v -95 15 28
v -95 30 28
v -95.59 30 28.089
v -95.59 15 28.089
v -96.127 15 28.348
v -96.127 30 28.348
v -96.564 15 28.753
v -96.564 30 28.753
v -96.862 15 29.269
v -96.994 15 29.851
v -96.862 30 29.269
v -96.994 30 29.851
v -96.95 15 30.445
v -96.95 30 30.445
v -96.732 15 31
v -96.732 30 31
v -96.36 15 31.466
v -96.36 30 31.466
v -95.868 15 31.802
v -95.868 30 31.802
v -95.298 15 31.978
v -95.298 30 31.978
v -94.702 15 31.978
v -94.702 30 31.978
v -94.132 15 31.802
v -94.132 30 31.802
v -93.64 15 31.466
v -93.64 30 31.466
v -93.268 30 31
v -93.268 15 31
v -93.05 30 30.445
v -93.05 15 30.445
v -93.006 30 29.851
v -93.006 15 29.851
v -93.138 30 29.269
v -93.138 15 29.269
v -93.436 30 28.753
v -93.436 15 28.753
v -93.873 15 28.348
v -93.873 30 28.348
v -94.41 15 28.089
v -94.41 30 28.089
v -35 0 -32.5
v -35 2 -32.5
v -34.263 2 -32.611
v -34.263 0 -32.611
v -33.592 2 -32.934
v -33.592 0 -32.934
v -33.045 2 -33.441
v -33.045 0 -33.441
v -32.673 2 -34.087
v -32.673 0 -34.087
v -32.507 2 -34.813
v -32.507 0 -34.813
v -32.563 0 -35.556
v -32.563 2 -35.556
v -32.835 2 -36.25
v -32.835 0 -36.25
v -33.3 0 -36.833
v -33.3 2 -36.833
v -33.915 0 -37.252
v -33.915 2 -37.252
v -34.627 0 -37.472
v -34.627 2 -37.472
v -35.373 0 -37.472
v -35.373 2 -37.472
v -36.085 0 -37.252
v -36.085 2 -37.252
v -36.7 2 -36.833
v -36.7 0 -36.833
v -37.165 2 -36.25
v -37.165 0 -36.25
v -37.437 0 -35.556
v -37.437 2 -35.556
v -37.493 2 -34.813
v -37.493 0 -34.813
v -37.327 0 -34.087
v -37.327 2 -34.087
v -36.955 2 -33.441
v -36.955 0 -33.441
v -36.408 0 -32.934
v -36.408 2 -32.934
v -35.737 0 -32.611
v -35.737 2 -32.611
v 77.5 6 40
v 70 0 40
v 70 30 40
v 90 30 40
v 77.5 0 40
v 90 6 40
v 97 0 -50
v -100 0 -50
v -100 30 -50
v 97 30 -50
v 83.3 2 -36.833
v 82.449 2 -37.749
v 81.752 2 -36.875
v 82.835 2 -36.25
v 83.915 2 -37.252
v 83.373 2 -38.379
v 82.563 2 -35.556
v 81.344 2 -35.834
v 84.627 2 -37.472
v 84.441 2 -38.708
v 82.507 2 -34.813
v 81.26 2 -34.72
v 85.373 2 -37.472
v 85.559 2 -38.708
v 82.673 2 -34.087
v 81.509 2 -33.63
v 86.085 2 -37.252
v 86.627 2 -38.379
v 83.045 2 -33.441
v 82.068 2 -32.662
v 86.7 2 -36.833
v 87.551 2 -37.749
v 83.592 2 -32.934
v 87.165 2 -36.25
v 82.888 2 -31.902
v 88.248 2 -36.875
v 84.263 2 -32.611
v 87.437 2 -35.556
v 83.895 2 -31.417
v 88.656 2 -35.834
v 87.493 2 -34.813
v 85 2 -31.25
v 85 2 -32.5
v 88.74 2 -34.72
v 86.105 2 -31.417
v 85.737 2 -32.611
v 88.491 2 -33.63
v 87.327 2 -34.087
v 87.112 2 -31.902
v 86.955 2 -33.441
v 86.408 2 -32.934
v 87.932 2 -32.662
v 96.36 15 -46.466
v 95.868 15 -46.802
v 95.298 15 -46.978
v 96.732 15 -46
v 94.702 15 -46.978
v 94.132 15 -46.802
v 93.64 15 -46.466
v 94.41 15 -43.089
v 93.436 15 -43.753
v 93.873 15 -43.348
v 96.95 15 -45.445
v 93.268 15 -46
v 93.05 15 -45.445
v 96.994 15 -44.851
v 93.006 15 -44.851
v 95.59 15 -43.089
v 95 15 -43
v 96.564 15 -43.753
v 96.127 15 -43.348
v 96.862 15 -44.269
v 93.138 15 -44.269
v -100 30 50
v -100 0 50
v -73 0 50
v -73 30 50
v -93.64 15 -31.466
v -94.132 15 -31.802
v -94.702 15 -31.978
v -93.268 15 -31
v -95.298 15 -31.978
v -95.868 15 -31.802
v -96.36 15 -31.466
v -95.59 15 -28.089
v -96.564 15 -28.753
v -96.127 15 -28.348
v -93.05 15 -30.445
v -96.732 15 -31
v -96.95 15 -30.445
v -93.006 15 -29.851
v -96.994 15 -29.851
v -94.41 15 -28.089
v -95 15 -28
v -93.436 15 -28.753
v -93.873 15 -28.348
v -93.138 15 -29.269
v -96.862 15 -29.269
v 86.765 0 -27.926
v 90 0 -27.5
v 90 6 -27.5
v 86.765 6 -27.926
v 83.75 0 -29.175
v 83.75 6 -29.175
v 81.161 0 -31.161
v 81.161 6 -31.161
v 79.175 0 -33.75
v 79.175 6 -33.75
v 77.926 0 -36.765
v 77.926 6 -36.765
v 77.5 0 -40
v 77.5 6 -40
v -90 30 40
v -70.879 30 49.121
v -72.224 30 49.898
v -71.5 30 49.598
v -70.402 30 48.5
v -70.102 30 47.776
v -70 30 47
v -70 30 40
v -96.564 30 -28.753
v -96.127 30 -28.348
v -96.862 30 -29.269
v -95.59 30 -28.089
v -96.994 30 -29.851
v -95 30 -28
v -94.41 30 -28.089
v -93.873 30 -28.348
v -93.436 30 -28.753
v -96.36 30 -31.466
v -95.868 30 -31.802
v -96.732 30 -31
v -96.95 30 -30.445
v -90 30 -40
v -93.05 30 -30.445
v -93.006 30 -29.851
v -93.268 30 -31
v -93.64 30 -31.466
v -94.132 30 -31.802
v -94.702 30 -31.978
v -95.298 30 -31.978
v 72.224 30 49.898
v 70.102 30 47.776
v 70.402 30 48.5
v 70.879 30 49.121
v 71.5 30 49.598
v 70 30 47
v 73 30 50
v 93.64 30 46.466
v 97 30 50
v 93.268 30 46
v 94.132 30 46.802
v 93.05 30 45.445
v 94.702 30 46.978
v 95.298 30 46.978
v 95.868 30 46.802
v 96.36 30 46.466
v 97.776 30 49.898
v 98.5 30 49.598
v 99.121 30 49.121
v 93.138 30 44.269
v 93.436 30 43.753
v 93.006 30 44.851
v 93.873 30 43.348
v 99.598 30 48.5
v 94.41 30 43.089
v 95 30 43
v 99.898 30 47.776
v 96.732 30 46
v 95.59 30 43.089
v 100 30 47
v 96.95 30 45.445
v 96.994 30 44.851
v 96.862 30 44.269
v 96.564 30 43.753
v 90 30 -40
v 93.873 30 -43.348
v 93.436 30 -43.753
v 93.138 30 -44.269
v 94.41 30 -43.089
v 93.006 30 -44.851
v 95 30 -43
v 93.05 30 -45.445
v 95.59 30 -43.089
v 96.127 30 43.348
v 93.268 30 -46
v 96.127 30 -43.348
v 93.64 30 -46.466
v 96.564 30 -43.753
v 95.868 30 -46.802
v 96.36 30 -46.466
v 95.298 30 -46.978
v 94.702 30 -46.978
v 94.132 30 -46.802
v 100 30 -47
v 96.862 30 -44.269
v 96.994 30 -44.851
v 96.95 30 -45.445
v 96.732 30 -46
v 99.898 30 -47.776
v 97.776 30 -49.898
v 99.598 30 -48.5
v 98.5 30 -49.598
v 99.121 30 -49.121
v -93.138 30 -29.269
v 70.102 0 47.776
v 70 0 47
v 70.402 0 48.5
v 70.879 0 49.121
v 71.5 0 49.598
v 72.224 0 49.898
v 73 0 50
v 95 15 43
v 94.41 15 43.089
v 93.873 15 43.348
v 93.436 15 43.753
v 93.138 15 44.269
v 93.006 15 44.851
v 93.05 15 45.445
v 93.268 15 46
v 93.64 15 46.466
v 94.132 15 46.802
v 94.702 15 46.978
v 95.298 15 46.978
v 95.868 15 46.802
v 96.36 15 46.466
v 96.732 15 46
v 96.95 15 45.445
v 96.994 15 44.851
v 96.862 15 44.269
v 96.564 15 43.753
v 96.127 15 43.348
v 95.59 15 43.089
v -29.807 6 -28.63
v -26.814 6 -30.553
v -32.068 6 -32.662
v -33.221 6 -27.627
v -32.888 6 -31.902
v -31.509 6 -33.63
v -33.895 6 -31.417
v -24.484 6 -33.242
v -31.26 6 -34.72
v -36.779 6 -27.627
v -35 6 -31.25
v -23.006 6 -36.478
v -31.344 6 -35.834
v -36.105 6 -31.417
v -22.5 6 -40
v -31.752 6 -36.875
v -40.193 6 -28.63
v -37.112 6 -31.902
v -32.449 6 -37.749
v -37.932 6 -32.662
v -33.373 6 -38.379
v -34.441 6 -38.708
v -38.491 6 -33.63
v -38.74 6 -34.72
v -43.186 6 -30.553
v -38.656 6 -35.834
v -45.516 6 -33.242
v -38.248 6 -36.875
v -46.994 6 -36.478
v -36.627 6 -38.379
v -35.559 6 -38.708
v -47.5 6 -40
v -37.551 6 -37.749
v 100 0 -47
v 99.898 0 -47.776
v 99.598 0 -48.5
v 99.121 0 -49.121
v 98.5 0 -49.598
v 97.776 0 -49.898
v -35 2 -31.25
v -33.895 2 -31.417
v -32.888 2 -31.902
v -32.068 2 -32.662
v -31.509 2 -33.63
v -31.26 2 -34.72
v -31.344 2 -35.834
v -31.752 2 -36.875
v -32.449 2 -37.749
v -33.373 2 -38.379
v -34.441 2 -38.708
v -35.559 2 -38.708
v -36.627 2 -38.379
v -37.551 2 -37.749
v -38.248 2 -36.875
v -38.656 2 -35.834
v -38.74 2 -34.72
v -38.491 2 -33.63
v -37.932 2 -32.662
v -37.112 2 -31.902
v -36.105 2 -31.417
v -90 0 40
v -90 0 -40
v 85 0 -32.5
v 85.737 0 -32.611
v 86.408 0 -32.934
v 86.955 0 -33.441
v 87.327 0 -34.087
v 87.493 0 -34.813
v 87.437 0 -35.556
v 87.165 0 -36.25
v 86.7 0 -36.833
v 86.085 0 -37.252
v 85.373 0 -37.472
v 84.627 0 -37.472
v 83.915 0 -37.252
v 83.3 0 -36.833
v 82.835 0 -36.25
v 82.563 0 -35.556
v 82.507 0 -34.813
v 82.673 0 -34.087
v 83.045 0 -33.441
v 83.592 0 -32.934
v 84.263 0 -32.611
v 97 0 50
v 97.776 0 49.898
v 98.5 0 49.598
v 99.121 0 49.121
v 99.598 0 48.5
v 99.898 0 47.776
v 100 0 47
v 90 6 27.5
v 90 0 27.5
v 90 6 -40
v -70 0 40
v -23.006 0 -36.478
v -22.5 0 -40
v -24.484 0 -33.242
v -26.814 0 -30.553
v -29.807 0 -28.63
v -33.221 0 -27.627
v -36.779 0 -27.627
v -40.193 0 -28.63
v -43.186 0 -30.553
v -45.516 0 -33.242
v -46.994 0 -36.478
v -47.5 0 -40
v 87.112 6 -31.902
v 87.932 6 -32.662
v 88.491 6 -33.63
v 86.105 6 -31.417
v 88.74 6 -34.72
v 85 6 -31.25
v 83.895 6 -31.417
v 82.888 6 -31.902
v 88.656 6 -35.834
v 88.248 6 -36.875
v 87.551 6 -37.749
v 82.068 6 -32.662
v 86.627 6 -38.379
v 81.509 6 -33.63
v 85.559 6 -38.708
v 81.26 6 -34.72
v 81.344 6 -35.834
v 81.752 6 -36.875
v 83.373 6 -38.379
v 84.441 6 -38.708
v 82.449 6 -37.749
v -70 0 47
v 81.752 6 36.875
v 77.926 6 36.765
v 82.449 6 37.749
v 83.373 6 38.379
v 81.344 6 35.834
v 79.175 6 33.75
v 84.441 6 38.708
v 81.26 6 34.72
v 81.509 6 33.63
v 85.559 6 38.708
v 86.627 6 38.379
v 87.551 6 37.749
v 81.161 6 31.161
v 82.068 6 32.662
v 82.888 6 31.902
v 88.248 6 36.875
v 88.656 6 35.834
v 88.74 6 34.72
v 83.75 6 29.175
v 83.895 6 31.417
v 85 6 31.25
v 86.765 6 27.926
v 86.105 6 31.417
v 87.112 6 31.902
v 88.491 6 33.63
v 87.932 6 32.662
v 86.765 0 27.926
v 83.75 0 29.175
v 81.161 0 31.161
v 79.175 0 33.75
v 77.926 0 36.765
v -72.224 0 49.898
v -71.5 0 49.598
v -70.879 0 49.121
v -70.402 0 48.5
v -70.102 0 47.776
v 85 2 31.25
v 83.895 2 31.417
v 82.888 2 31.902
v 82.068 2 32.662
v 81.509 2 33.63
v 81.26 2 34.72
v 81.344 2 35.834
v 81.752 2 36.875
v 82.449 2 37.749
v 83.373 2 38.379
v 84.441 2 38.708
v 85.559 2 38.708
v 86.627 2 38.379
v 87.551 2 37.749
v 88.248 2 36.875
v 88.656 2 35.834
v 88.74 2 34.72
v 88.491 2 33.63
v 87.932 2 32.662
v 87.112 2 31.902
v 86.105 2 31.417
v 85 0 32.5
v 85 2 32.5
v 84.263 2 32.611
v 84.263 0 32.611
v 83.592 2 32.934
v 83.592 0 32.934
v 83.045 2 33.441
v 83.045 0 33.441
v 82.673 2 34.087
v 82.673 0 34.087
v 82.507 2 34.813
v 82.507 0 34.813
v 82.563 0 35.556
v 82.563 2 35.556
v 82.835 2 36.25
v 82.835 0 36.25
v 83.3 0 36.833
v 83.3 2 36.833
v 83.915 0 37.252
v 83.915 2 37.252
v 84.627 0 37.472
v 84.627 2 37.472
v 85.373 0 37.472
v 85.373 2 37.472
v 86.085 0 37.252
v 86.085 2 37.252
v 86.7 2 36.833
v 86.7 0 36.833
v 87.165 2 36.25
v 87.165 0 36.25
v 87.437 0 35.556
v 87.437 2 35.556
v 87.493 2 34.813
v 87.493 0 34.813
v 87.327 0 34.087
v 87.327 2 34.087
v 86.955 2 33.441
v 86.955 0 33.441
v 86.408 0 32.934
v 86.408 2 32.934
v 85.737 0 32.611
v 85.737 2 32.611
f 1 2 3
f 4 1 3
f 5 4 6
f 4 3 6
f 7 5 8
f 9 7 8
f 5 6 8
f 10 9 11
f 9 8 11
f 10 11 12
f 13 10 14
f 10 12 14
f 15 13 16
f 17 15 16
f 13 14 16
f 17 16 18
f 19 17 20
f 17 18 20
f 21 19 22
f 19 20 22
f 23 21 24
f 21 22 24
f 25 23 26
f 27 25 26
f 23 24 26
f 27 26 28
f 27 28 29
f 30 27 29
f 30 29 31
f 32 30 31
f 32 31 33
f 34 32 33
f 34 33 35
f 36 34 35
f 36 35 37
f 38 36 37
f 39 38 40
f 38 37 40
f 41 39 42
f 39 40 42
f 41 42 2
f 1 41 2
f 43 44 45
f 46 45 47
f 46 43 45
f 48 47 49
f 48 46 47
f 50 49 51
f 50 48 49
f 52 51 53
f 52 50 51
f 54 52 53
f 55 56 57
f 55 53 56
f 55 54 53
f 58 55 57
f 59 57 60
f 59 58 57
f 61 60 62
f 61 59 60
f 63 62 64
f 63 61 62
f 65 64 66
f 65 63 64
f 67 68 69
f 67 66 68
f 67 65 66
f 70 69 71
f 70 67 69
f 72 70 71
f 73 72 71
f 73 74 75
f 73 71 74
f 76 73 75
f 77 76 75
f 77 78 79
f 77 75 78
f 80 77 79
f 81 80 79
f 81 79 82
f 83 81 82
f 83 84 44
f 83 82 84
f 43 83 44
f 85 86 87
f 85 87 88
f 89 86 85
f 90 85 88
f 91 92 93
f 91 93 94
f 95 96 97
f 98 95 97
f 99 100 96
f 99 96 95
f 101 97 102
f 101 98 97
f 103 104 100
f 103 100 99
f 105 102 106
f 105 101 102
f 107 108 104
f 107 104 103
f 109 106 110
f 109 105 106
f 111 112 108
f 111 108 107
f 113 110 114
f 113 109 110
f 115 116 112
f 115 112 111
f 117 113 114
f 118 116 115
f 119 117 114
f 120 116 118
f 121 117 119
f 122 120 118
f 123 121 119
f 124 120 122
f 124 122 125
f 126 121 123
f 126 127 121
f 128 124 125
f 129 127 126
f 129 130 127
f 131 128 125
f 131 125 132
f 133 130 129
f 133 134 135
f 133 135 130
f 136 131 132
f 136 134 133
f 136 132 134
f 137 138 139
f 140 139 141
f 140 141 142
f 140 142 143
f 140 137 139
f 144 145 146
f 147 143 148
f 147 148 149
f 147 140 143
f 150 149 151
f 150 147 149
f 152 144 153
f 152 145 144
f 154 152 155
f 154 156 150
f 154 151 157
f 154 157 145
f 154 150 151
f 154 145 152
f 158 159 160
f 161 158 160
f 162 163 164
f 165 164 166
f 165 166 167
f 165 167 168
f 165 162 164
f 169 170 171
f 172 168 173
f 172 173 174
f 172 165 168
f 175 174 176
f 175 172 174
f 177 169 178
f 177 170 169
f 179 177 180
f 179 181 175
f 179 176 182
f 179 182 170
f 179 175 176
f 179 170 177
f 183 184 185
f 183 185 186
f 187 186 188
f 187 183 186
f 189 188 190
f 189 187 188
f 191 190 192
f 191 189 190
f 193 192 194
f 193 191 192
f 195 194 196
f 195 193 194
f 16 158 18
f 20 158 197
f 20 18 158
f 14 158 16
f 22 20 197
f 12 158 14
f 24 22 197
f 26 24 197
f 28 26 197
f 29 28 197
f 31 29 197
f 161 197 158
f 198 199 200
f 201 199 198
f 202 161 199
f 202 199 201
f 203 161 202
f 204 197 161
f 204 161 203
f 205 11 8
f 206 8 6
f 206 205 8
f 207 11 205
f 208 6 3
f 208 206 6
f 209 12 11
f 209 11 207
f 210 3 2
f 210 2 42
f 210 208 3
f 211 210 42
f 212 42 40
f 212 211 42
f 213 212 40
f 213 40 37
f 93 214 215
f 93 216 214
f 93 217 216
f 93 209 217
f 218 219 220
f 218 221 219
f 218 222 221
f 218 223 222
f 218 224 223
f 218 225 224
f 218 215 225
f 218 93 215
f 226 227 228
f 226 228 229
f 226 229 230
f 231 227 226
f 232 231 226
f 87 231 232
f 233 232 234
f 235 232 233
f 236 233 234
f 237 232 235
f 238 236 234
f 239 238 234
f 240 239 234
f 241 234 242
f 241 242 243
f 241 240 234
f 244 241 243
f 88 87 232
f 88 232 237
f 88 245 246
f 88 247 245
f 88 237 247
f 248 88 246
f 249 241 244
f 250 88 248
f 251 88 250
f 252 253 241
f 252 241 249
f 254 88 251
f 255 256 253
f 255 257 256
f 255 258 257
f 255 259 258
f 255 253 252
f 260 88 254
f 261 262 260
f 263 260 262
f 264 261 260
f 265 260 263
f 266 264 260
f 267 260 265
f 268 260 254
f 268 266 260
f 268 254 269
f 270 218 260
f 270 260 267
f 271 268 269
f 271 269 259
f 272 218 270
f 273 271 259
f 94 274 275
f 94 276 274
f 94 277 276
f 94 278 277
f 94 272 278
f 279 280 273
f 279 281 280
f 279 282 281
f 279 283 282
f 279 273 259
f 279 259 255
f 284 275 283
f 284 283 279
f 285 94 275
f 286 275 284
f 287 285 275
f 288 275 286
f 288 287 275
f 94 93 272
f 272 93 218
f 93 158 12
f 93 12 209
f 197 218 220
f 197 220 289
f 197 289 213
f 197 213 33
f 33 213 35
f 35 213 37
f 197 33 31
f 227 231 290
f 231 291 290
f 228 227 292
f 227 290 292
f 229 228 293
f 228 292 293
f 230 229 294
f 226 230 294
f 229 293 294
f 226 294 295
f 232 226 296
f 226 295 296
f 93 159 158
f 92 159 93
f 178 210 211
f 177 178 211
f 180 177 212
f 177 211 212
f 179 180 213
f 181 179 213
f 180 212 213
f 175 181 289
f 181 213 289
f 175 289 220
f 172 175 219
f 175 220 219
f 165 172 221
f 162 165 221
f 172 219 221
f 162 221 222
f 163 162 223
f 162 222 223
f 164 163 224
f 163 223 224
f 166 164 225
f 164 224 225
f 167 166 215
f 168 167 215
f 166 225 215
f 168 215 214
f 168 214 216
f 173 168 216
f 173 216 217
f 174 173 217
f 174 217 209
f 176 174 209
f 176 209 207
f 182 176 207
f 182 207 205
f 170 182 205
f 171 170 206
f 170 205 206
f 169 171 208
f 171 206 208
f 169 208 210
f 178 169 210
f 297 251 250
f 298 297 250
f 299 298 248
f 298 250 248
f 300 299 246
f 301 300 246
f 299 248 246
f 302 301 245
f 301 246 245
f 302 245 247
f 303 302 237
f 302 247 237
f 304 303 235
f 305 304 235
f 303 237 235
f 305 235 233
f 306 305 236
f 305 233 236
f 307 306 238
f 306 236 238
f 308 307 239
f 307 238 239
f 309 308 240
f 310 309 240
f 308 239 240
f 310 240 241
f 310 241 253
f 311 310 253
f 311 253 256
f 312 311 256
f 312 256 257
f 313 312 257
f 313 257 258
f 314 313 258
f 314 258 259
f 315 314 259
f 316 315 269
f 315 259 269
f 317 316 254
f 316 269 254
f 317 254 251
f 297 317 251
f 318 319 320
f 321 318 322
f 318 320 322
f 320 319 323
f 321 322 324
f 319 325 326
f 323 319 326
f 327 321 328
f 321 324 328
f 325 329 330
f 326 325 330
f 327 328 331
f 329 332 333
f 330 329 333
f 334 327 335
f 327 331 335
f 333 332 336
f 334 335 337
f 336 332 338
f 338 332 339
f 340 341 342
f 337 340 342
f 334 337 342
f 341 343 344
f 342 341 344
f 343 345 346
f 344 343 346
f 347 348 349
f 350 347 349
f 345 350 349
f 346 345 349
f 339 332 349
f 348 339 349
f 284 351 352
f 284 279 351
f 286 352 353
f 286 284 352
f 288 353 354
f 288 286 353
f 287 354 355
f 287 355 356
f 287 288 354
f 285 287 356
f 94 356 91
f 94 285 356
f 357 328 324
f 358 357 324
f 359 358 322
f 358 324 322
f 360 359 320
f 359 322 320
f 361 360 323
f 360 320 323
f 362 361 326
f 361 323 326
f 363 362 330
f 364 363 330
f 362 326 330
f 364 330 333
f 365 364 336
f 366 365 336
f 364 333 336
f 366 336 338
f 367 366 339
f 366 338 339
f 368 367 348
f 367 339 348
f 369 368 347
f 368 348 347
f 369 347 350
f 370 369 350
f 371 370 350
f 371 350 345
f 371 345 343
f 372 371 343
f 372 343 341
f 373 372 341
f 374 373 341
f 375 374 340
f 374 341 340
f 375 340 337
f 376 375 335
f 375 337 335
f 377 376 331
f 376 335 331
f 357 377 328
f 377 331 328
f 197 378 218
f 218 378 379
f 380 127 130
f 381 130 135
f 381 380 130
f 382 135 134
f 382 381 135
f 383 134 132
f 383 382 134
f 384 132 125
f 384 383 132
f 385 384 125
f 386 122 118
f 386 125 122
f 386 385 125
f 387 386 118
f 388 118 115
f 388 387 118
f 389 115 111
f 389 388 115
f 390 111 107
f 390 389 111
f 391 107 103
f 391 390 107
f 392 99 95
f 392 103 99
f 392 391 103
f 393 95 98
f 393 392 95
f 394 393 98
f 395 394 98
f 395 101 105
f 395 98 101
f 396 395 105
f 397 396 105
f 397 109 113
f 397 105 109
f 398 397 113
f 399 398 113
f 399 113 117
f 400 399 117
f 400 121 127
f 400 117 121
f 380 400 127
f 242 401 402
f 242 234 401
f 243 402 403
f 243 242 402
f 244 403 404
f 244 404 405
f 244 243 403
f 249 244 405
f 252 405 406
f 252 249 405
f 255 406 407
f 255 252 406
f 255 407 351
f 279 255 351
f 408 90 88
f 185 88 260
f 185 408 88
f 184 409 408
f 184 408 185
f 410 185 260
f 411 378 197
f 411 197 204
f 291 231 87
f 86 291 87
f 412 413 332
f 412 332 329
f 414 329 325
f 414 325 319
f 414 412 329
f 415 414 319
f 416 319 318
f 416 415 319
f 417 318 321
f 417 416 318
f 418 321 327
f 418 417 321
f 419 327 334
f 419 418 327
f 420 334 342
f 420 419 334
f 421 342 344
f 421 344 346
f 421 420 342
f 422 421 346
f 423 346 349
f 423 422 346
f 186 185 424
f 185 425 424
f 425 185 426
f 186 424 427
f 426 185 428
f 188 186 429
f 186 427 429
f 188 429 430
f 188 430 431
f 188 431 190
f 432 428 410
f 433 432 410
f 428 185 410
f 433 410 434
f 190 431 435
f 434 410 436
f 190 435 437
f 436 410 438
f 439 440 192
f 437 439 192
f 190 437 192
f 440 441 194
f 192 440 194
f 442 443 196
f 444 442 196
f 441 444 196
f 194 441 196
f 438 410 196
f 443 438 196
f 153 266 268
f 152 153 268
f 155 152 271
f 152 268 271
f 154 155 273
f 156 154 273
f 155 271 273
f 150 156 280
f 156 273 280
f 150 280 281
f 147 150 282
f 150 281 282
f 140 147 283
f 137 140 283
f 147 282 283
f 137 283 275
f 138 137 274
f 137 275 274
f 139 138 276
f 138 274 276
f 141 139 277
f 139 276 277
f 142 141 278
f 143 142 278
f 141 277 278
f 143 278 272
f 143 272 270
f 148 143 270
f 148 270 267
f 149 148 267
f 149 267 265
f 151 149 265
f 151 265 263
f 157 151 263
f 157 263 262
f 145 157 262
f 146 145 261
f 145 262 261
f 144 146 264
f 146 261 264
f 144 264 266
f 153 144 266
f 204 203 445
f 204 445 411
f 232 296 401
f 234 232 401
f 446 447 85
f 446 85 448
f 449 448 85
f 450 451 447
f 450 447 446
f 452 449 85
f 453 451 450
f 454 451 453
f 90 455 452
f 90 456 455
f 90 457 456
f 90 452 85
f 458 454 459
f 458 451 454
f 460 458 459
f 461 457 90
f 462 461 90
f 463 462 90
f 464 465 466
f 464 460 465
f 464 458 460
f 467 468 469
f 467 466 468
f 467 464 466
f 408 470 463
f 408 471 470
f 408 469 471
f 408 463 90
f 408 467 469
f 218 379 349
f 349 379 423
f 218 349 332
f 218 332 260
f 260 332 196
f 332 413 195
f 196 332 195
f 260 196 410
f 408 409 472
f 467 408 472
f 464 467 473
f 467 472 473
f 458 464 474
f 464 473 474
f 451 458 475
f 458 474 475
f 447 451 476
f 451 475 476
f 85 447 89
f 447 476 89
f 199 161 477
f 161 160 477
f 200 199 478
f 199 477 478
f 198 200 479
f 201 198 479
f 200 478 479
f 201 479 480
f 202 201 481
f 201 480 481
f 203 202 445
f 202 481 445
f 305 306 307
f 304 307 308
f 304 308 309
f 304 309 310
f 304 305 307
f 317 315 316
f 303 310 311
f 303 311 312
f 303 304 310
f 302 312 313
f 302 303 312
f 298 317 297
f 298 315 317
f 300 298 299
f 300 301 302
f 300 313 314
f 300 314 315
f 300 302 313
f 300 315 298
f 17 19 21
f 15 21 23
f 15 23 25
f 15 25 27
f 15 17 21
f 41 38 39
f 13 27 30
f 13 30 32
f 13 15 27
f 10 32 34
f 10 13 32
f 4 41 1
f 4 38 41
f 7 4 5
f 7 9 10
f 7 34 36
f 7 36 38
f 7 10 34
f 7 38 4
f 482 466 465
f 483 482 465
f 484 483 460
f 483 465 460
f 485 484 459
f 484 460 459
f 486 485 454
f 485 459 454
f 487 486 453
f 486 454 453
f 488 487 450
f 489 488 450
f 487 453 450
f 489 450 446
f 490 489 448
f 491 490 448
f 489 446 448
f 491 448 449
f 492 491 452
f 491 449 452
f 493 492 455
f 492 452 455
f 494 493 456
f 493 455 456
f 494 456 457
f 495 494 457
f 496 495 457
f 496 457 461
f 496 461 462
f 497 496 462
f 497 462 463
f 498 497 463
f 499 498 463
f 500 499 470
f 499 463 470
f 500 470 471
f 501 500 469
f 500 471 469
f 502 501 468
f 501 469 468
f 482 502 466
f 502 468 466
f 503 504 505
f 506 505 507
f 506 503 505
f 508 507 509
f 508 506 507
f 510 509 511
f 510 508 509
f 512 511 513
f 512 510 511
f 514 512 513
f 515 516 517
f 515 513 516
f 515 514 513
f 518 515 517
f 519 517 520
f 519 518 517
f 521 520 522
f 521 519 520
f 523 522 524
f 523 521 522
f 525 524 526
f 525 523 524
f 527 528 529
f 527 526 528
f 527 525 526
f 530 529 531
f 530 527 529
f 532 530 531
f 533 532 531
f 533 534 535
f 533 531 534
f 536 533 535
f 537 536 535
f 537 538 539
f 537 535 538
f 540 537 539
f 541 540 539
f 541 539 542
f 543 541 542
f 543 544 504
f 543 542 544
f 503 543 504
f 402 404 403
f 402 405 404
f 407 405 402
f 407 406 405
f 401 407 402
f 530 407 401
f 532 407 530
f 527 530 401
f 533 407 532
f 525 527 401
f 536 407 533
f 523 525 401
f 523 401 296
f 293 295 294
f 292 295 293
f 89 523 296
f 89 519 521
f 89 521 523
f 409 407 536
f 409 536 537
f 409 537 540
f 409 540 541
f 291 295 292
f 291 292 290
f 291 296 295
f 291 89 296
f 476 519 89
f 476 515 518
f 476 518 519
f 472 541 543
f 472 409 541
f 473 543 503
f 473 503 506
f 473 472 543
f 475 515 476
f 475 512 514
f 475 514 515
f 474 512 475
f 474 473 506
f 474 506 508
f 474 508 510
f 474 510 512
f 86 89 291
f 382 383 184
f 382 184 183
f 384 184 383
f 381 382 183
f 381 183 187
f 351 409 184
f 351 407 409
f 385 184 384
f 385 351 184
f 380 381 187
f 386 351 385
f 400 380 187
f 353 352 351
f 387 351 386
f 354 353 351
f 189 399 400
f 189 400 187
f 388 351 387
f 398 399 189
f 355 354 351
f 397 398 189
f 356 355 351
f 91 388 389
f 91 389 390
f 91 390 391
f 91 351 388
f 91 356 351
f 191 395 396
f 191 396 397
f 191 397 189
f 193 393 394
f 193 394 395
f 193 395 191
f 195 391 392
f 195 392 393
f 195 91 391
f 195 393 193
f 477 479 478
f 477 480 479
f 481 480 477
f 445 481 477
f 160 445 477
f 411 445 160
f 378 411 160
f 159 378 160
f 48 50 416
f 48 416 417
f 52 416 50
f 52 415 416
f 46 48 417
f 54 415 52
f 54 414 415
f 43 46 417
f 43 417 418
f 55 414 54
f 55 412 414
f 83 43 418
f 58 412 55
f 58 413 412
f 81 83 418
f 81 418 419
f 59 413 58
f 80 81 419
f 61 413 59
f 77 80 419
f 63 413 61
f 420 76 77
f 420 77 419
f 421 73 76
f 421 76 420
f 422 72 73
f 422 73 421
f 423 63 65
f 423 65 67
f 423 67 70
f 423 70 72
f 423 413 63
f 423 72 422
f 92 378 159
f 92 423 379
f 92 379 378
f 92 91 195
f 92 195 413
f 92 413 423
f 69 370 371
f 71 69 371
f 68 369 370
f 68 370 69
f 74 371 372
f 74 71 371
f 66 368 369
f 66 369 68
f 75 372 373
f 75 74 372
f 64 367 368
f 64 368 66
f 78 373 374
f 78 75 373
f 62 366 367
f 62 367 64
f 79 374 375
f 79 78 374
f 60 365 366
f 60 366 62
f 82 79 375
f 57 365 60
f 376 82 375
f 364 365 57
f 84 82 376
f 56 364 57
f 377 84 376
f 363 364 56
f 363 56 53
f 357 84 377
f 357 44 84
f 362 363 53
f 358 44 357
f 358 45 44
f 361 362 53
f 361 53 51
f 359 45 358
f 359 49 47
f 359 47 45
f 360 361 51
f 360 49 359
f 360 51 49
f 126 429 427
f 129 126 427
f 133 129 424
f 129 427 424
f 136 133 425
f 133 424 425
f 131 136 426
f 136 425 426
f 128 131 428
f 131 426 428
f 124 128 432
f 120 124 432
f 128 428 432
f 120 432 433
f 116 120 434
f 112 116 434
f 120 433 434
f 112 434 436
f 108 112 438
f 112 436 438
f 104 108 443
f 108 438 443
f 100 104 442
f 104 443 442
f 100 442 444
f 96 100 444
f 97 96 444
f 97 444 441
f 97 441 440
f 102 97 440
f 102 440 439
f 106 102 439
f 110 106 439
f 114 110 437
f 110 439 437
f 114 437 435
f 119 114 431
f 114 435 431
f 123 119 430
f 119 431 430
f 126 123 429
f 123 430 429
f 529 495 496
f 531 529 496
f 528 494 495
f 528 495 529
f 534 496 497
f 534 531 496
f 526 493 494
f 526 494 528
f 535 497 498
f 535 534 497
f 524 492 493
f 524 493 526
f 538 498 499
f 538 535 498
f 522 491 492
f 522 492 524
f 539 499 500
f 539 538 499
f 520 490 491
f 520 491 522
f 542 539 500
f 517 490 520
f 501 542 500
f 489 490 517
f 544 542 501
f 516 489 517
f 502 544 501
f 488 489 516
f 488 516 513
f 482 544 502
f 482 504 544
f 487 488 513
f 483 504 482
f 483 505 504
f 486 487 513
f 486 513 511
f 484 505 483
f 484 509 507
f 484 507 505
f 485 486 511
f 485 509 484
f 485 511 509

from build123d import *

# Parameters (mm, degrees)
SKETCH1_W           = 200
SKETCH1_H           = 100
SKETCH1_W_2         = 180
SKETCH1_H_2         = 80
BOSS_EXTRUDE1_DEPTH = 30
SKETCH2_R           = 2.5
BOSS_EXTRUDE2_DEPTH = 6
SKETCH3_R           = 3.75
CUT_EXTRUDE1_DEPTH  = 4
SKETCH4_R           = 2
CUT_EXTRUDE2_DEPTH  = 15
SKETCH5_W           = 140
SKETCH5_H           = 10
CUT_EXTRUDE3_DEPTH  = 116.758369028
FILLET1_R           = 3


with BuildPart() as part:
    # Sketch1 → Boss-Extrude1 (new body)
    with BuildSketch(Plane(origin=(0, 0, 0), x_dir=(1, 0, 0), z_dir=(0, 1, 0))):
        Rectangle(SKETCH1_W, SKETCH1_H)
        Rectangle(SKETCH1_W_2, SKETCH1_H_2, mode=Mode.SUBTRACT)
    extrude(amount=BOSS_EXTRUDE1_DEPTH)

    # Sketch2 → Boss-Extrude2 (add)
    # profile 1 of 3: a face of its own
    with BuildSketch(Plane(origin=(0, 0, 0), x_dir=(1, 0, 0), z_dir=(0, 1, 0))):
        with BuildLine():
            Line((77.5, 40), (90, 40))
            Line((90, 40), (90, 27.5))
            ThreePointArc((90, 27.5), (81.161165235, 31.161165235), (77.5, 40))
        make_face()
        with Locations(Location((85, 35, 0), (0, 0, 270))):
            Circle(SKETCH2_R, mode=Mode.SUBTRACT)
    # profile 2 of 3: a face of its own
    with BuildSketch(Plane(origin=(0, 0, 0), x_dir=(1, 0, 0), z_dir=(0, 1, 0))):
        with BuildLine():
            Line((90, -40), (90, -27.5))
            ThreePointArc((90, -27.5), (81.161165235, -31.161165235), (77.5, -40))
            Line((77.5, -40), (90, -40))
        make_face()
        with Locations(Location((85, -35, 0), (0, 0, 90))):
            Circle(SKETCH2_R, mode=Mode.SUBTRACT)
    # profile 3 of 3: a face of its own
    with BuildSketch(Plane(origin=(0, 0, 0), x_dir=(1, 0, 0), z_dir=(0, 1, 0))):
        with BuildLine():
            Line((-47.5, 40), (-22.5, 40))
            ThreePointArc((-22.5, 40), (-35, 27.5), (-47.5, 40))
        make_face()
        with Locations(Location((-35, 35, 0), (0, 0, 270))):
            Circle(SKETCH2_R, mode=Mode.SUBTRACT)
    extrude(amount=BOSS_EXTRUDE2_DEPTH)

    # Sketch3 → Cut-Extrude1 (cut)
    with BuildSketch(Plane(origin=(0, 6, 0), x_dir=(1, 0, 0), z_dir=(0, 1, 0))):
        with Locations(Location((-35, 35, 0), (0, 0, 270))):
            Circle(SKETCH3_R)
        with Locations(Location((85, 35, 0), (0, 0, 270))):
            Circle(SKETCH3_R)
        with Locations(Location((85, -35, 0), (0, 0, 90))):
            Circle(SKETCH3_R)
    extrude(amount=-CUT_EXTRUDE1_DEPTH, mode=Mode.SUBTRACT)

    # Sketch4 → Cut-Extrude2 (cut)
    with BuildSketch(Plane(origin=(0, 30, 0), x_dir=(1, 0, 0), z_dir=(0, 1, 0))):
        with Locations(Location((95, 45, 0), (0, 0, 270))):
            Circle(SKETCH4_R)
        with Locations(Location((95, -45, 0), (0, 0, 90))):
            Circle(SKETCH4_R)
        with Locations(Location((-95, 30, 0), (0, 0, 270))):
            Circle(SKETCH4_R)
        with Locations(Location((-95, -30, 0), (0, 0, 90))):
            Circle(SKETCH4_R)
    extrude(amount=-CUT_EXTRUDE2_DEPTH, mode=Mode.SUBTRACT)

    # Sketch5 → Cut-Extrude3 (cut, through all)
    with BuildSketch(Plane(origin=(0, 30, 0), x_dir=(1, 0, 0), z_dir=(0, 1, 0))):
        with Locations((0, -45)):
            Rectangle(SKETCH5_W, SKETCH5_H)
    extrude(amount=-CUT_EXTRUDE3_DEPTH, mode=Mode.SUBTRACT)

    # Fillet1
    fillet1_edges = [part.edges().sort_by_distance(p)[0] for p in [
        (70, 15, 50),
        (-70, 15, 50),
        (100, 15, 50),
        (100, 15, -50),
    ]]
    fillet(fillet1_edges, radius=FILLET1_R)


solid = part.part
